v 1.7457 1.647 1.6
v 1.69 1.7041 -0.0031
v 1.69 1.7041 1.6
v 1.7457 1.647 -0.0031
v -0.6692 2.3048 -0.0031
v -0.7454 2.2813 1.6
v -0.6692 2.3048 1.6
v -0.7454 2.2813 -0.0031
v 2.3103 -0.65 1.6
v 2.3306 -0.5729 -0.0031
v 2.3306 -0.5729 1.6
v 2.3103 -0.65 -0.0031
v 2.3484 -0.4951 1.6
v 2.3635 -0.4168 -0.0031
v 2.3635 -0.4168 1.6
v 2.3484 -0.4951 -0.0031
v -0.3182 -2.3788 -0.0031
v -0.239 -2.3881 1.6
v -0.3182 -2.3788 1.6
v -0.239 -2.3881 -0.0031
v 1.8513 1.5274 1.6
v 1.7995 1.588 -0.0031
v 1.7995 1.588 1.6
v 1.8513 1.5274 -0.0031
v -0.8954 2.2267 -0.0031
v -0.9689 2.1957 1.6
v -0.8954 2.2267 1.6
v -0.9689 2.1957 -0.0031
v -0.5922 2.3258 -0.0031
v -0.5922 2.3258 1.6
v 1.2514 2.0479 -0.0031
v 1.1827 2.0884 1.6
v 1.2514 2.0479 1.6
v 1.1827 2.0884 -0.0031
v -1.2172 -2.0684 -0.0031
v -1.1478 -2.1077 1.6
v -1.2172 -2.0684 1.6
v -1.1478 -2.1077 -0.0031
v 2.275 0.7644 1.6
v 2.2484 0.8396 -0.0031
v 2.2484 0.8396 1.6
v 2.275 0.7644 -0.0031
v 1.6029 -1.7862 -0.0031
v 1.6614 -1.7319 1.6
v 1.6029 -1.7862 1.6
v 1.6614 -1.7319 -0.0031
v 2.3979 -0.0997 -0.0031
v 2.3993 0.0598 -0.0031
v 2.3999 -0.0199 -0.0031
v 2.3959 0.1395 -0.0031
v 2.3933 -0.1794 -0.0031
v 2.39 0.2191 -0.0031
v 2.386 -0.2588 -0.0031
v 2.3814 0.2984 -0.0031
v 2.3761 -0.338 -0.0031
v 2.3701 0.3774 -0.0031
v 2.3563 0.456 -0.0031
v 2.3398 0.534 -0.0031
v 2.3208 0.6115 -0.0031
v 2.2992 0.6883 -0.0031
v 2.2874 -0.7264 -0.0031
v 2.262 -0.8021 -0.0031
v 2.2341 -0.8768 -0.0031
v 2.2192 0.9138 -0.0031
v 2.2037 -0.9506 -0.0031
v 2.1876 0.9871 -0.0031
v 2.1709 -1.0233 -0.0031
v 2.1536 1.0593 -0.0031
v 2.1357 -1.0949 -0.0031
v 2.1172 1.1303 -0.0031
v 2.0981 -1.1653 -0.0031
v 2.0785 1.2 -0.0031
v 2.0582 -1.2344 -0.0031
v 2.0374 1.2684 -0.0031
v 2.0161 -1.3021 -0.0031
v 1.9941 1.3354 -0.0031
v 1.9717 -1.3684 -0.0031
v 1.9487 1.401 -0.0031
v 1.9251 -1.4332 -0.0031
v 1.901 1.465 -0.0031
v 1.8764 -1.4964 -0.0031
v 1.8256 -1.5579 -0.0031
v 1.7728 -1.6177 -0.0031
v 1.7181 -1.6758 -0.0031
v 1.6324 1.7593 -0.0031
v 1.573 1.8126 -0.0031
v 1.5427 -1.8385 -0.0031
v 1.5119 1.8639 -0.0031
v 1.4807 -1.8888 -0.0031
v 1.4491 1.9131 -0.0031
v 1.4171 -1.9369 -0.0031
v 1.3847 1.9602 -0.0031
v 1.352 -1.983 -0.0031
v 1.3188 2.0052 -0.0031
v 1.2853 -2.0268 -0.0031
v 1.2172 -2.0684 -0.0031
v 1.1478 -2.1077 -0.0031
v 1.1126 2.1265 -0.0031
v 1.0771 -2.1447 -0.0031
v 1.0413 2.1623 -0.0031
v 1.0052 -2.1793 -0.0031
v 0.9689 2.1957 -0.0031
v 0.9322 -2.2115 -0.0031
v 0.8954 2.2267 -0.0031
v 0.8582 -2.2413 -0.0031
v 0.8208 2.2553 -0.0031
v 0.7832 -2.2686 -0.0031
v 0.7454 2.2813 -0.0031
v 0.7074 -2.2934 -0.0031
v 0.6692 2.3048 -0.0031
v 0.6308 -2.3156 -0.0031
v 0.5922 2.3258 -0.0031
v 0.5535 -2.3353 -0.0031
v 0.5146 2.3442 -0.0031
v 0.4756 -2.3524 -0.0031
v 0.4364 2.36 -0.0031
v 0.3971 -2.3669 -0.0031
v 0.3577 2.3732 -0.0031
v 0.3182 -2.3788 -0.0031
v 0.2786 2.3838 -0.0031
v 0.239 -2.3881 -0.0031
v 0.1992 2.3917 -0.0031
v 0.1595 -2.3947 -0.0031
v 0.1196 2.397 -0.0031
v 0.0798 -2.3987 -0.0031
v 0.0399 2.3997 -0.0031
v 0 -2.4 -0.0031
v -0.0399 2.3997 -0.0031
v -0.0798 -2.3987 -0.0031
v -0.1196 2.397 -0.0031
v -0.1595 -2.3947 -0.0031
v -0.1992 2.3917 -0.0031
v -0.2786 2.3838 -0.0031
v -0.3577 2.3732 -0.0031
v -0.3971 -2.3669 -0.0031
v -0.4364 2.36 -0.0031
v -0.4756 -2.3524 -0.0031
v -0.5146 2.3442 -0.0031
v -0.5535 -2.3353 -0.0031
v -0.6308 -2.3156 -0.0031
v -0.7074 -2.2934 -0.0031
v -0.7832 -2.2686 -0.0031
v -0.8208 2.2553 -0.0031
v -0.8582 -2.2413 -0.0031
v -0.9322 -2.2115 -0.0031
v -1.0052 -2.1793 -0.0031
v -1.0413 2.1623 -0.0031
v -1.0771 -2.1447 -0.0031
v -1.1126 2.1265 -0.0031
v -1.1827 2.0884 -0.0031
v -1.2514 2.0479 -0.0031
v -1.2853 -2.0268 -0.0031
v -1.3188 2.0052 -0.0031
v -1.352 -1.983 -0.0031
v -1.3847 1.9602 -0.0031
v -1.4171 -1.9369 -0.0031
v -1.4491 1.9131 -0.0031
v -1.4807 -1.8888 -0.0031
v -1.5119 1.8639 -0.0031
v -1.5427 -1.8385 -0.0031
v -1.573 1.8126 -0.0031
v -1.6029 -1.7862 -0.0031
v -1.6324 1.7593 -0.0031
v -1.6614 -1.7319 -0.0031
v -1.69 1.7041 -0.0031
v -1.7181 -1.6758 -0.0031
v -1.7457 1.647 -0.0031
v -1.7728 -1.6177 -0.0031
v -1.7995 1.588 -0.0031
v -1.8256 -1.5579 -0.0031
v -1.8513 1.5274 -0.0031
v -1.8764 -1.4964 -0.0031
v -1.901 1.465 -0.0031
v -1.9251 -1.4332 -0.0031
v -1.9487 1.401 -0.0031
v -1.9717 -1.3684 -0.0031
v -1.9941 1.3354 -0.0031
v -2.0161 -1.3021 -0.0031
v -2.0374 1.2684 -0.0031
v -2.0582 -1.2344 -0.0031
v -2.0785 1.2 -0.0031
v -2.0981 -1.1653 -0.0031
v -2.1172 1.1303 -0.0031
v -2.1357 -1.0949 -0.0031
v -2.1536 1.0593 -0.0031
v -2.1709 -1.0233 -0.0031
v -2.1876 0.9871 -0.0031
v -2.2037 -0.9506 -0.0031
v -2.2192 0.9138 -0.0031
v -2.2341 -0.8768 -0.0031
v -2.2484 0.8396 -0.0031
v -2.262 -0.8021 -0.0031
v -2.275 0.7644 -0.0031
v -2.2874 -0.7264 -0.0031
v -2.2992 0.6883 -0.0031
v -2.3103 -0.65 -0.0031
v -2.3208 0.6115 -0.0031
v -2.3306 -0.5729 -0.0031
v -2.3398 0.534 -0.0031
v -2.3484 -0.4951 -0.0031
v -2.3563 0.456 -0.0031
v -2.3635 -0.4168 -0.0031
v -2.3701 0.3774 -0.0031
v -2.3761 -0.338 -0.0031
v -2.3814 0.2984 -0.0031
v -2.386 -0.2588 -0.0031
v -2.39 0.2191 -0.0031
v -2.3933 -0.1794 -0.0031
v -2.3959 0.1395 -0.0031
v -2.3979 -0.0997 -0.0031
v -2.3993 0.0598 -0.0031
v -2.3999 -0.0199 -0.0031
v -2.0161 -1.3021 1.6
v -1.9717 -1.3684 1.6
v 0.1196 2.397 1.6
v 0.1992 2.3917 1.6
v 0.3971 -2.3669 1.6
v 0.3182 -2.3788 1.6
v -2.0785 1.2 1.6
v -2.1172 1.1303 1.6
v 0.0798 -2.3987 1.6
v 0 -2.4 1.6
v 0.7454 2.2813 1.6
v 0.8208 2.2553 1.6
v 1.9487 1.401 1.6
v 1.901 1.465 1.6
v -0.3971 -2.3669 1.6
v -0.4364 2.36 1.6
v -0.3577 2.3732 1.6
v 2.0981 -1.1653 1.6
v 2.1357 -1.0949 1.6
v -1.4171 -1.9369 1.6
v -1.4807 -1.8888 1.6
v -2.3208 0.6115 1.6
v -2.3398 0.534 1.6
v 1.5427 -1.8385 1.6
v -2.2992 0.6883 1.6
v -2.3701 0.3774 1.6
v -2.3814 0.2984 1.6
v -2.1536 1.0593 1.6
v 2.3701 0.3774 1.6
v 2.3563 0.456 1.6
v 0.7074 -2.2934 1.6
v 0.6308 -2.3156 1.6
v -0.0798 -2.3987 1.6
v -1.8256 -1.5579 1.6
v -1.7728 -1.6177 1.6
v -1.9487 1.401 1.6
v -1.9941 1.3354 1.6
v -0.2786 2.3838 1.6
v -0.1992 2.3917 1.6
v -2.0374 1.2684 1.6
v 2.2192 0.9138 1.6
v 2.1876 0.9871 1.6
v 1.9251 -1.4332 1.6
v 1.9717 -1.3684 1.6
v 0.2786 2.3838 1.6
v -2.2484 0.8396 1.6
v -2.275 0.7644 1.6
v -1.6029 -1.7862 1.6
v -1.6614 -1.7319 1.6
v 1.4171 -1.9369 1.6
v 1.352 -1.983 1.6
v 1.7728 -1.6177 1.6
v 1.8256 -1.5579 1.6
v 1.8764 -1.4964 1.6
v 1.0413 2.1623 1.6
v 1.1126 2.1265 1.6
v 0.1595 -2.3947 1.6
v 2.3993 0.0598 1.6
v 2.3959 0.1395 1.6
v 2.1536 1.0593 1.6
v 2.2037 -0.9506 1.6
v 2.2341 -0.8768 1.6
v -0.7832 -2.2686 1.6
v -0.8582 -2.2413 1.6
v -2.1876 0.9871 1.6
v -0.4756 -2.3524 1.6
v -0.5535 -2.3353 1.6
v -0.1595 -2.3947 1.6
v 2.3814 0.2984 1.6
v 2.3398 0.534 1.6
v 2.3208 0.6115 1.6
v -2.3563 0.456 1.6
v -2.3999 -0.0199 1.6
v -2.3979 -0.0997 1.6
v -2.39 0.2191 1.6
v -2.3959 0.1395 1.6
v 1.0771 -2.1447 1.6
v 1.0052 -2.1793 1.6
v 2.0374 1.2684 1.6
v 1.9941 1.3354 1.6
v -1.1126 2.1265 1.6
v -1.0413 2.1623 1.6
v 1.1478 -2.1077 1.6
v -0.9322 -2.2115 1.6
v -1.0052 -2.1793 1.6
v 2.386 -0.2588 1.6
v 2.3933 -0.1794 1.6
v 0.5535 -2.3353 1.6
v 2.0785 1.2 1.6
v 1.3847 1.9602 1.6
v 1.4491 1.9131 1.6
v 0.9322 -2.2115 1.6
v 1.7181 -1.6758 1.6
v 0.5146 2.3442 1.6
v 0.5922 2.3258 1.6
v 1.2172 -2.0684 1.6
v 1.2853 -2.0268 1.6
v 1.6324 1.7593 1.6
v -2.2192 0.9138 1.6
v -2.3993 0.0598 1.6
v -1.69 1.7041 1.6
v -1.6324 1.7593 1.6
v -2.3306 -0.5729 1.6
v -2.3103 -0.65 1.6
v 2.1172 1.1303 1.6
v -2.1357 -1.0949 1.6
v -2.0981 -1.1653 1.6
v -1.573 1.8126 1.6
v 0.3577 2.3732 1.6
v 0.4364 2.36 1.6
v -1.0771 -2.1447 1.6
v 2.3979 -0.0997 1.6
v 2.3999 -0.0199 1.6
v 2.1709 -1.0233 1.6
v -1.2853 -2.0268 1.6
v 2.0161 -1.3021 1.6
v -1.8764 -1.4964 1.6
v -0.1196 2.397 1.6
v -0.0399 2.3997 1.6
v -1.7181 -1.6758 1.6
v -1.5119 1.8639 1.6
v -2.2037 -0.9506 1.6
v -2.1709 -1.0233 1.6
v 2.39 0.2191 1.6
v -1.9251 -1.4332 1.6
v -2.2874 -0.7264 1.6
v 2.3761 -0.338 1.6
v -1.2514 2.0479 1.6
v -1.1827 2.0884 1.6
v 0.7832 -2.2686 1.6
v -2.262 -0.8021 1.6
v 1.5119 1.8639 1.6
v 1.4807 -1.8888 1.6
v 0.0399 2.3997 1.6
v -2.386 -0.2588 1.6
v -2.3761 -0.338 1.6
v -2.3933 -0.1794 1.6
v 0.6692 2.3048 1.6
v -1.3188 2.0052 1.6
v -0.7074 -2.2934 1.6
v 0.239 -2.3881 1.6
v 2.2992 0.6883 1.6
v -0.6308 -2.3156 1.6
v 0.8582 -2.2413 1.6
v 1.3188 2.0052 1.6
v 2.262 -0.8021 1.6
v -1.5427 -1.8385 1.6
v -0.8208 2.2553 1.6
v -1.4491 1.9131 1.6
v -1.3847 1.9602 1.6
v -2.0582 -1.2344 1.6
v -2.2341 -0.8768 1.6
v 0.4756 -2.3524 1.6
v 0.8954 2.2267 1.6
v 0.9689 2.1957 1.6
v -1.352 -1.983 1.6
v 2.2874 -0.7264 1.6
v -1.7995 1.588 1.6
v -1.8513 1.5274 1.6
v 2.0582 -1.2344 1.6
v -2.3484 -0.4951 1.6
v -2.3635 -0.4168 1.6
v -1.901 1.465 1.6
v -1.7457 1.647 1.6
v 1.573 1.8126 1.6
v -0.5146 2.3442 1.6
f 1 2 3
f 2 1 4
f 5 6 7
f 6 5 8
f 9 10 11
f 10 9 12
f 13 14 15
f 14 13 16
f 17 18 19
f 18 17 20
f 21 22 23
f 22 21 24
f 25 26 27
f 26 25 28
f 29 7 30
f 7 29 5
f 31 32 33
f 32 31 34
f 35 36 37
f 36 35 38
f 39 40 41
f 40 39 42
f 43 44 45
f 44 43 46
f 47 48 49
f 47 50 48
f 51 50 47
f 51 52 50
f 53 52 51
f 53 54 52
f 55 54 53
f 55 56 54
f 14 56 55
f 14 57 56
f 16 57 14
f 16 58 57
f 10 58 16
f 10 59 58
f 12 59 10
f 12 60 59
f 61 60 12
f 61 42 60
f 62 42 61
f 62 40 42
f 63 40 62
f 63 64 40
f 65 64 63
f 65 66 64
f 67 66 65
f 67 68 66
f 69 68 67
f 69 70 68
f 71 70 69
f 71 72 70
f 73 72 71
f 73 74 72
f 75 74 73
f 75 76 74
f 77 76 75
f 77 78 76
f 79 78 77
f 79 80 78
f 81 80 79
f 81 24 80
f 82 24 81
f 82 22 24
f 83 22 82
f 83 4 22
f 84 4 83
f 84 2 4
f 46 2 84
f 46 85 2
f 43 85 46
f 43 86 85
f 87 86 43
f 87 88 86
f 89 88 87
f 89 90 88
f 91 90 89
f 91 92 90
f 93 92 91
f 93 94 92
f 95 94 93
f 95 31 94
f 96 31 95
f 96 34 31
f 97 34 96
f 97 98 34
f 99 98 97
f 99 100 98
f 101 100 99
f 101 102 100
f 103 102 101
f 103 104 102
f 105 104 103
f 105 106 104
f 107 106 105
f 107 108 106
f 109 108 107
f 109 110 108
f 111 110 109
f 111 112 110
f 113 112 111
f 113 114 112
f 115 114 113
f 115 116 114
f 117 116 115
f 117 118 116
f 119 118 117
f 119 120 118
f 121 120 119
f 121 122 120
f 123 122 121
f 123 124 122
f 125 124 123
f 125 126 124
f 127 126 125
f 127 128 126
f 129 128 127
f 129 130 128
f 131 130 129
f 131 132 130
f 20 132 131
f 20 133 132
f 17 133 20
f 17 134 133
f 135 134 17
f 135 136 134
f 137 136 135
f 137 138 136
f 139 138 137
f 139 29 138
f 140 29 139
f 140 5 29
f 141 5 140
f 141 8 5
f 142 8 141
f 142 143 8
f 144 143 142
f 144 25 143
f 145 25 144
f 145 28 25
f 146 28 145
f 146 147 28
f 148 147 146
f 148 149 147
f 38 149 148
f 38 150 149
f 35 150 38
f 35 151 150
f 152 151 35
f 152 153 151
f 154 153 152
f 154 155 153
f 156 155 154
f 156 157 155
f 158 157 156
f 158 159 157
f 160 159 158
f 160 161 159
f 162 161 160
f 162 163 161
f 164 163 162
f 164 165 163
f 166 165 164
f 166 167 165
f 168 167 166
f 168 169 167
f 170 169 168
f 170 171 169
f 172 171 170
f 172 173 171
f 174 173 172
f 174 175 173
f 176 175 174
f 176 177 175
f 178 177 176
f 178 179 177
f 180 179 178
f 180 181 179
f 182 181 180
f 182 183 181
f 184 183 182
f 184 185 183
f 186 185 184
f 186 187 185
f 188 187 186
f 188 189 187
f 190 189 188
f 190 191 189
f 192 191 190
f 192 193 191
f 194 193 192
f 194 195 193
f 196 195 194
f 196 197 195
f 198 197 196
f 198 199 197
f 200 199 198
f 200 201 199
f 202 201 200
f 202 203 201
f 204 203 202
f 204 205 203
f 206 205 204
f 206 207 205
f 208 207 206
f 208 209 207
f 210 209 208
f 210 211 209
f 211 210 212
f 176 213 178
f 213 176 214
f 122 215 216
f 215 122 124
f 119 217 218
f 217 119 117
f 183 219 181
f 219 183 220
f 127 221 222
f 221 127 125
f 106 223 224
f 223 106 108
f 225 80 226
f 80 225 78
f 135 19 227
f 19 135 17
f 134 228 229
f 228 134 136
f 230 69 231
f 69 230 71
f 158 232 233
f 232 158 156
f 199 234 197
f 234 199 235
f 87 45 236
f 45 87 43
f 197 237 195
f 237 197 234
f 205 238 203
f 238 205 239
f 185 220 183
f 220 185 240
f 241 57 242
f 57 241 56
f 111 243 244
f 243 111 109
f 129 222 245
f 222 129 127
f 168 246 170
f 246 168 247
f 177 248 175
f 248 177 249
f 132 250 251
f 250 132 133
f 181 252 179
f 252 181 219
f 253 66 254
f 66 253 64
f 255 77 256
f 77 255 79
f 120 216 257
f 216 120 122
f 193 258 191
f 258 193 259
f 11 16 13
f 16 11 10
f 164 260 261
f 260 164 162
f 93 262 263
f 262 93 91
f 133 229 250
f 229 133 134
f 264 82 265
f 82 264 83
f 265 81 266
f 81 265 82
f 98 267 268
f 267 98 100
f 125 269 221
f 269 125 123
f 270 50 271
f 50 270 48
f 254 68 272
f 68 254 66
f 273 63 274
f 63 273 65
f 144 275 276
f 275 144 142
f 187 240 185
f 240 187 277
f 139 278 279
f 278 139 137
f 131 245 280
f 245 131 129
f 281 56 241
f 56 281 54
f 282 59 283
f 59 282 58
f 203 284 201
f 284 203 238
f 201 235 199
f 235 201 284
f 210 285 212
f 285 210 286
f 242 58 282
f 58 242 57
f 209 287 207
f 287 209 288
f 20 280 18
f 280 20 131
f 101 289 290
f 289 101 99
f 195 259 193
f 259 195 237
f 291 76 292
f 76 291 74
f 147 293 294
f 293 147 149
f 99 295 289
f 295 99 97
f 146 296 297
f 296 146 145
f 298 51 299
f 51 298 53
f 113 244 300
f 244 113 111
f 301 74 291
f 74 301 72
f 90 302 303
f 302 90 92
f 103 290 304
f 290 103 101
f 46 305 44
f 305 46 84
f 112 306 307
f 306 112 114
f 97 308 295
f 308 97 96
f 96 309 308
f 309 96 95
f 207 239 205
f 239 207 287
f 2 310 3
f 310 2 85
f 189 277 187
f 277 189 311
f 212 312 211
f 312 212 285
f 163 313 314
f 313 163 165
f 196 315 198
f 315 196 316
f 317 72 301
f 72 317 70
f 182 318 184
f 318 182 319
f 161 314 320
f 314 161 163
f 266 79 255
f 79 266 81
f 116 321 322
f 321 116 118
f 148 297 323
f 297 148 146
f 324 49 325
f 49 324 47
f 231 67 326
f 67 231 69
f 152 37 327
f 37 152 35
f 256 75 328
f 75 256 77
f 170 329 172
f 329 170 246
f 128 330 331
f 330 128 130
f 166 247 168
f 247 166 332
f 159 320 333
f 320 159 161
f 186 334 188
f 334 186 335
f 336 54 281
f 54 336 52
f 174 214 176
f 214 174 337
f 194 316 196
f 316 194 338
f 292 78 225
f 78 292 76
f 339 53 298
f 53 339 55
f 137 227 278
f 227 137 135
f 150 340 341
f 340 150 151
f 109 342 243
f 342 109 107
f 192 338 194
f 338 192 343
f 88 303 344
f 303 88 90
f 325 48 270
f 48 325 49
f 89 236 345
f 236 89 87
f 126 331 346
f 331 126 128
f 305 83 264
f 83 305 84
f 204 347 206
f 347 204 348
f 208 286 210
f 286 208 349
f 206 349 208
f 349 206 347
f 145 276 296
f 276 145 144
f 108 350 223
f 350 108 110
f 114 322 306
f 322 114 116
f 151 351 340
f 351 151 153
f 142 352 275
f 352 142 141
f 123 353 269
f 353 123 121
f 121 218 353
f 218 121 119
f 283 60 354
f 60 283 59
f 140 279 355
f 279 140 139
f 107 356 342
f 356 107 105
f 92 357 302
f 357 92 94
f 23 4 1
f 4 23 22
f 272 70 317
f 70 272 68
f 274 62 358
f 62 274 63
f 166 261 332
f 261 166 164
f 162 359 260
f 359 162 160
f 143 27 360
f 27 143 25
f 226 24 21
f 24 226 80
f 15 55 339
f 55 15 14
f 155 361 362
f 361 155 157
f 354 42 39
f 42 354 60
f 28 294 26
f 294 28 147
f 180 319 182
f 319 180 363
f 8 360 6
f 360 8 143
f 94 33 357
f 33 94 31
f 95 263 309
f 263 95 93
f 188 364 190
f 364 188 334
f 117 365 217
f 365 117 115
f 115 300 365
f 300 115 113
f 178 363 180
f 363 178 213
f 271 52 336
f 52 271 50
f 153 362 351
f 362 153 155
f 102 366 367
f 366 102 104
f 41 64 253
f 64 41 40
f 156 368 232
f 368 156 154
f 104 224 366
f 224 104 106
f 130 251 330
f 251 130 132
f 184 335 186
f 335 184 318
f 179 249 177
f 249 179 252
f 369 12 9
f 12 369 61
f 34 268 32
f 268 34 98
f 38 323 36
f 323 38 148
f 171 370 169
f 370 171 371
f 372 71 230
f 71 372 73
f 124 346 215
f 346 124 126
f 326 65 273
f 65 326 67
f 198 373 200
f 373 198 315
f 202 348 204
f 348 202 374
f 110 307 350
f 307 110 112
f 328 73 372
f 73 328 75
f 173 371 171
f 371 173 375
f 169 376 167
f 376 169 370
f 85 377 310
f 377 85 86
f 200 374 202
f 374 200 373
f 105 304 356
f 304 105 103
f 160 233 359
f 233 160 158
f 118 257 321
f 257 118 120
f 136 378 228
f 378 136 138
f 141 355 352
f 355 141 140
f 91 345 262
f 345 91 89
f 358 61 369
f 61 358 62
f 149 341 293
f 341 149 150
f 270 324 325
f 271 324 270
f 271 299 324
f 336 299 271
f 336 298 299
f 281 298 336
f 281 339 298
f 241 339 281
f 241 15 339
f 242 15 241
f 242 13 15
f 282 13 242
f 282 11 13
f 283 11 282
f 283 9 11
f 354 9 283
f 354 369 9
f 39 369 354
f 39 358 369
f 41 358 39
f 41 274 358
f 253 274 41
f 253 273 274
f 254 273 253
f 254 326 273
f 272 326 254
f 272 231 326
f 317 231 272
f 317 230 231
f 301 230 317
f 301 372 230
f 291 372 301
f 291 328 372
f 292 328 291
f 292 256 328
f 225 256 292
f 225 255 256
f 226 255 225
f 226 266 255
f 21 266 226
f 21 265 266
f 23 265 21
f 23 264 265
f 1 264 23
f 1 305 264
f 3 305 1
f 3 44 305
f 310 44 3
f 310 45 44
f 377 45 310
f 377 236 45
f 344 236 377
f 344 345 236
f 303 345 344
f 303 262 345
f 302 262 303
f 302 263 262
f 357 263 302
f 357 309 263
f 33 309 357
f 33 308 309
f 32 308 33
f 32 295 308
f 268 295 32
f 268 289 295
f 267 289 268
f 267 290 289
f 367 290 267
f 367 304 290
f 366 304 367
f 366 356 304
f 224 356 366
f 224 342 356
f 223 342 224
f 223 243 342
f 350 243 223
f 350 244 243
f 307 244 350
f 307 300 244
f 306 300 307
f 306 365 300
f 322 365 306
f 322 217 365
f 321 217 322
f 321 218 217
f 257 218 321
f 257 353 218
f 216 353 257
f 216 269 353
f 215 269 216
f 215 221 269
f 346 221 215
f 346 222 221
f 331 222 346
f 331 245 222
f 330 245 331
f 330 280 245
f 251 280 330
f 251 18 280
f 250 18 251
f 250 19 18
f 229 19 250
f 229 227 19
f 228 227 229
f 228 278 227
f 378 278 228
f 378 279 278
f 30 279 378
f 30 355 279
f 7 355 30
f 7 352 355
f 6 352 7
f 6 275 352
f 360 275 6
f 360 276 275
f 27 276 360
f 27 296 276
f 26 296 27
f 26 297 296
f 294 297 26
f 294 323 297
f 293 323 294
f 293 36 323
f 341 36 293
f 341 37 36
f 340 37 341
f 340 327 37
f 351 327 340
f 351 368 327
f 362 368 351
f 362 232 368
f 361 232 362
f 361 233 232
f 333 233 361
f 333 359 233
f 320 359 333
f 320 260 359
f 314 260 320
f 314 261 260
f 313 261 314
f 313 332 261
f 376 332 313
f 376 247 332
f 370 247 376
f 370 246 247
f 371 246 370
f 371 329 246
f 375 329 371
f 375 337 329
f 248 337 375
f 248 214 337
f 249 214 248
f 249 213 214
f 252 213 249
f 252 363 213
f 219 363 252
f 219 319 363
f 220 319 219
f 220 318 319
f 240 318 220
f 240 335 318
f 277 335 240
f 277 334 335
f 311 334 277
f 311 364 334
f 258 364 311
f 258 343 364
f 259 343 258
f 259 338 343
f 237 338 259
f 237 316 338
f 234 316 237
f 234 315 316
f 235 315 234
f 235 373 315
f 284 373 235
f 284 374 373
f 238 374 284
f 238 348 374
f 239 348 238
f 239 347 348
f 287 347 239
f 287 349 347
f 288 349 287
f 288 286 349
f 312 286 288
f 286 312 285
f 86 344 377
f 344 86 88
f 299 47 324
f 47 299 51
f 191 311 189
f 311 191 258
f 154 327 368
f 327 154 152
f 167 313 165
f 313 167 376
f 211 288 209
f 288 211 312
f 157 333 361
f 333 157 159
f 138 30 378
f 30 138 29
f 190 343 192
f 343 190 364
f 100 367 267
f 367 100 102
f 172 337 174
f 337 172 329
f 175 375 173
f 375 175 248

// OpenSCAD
use <../lib.scad>
use <s/3960px1s01.scad>
use <s/3960s01.scad>
use <s/3960s05.scad>
$fa=1; $fs=0.2;
function ldraw_lib__3960px1(realsolid=false) = [
// 0 Dish  4 x  4 Inverted with Medium Blue, White, Sliver and Black Concentric Circles Pattern
// 0 Name: 3960px1.dat
// 0 Author: Gerald Lasser [GeraldLasser]
// 0 !LDRAW_ORG Part UPDATE 2019-03
// 0 !LICENSE Licensed under CC BY 2.0 and CC BY 4.0 : see CAreadme.txt
// 
// 0 BFC CERTIFY CCW
  [0,"BFC","CERTIFY"],
  [0,"BFC","CCW"],
// 
// 0 !KEYWORDS Bricklink 3960pb049, set 21314, Tron
// 
// 0 !HISTORY 2019-12-27 [PTadmin] Official Update 2019-03
// 
// 
// 1 16 0 0 0 1 0 0 0 1 0 0 0 1 s\3960s01.dat
  [1,16,0,0,0,1,0,0,0,1,0,0,0,1, ldraw_lib__s__3960s01(realsolid)],
// 
// 1 16 0 0 0 1 0 0 0 1 0 0 0 1 s\3960px1s01.dat
  [1,16,0,0,0,1,0,0,0,1,0,0,0,1, ldraw_lib__s__3960px1s01(realsolid)],
// 1 16 0 0 0 -1 0 0 0 1 0 0 0 1 s\3960px1s01.dat
  [1,16,0,0,0,-1,0,0,0,1,0,0,0,1, ldraw_lib__s__3960px1s01(realsolid)],
// 1 16 0 0 0 1 0 0 0 1 0 0 0 -1 s\3960px1s01.dat
  [1,16,0,0,0,1,0,0,0,1,0,0,0,-1, ldraw_lib__s__3960px1s01(realsolid)],
// 1 16 0 0 0 -1 0 0 0 1 0 0 0 -1 s\3960px1s01.dat
  [1,16,0,0,0,-1,0,0,0,1,0,0,0,-1, ldraw_lib__s__3960px1s01(realsolid)],
// 
// 1 16 0 0 0 0 0 -1 0 1 0 1 0 0 s\3960px1s01.dat
  [1,16,0,0,0,0,0,-1,0,1,0,1,0,0, ldraw_lib__s__3960px1s01(realsolid)],
// 1 16 0 0 0 0 0 -1 0 1 0 -1 0 0 s\3960px1s01.dat
  [1,16,0,0,0,0,0,-1,0,1,0,-1,0,0, ldraw_lib__s__3960px1s01(realsolid)],
// 1 16 0 0 0 0 0 1 0 1 0 1 0 0 s\3960px1s01.dat
  [1,16,0,0,0,0,0,1,0,1,0,1,0,0, ldraw_lib__s__3960px1s01(realsolid)],
// 1 16 0 0 0 0 0 1 0 1 0 -1 0 0 s\3960px1s01.dat
  [1,16,0,0,0,0,0,1,0,1,0,-1,0,0, ldraw_lib__s__3960px1s01(realsolid)],
// 
// 1 16 0 0 0 1 0 0 0 1 0 0 0 1 s\3960s05.dat
  [1,16,0,0,0,1,0,0,0,1,0,0,0,1, ldraw_lib__s__3960s05(realsolid)],
];
module ldraw_lib__3960px1(step=0, col=false, unit=2/5, alt=false, line=0.2, solid=!$preview)
    makepoly(ldraw_lib__3960px1(solid), step=step, col=col, unit=unit, alt=alt, line=line, solid=solid);
ldraw_lib__3960px1(line=0.2);
